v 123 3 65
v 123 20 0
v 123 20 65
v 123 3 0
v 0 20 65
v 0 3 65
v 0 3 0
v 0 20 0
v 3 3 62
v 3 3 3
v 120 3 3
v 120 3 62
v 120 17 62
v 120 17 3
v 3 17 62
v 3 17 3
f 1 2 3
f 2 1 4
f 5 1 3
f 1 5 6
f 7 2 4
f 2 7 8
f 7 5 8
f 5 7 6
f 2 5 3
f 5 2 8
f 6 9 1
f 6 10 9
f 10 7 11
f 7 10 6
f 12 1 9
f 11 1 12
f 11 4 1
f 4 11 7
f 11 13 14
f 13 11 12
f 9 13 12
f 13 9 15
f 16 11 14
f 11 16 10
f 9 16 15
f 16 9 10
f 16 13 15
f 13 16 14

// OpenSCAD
// file: ../_lib/shapes.scad
module box(size, thickness) {
	difference() {
		cube(size);

		translate([thickness, thickness, thickness])
		#cube(size - [thickness * 2, thickness * 2, thickness * 2]);
	}
}

difference() {

	box([10, 20, 30], 1);
	cube([100, 100, 5]);
}
// main file
a5_lx = 115;
a5_ly = 13;
a5_lz = 58;

thickness = 3;
clearance_x = 1;
clearance_y = 0.5;
clearance_z = 0.5;

support_x = 5;
support_z = 3;

use <../_lib/shapes.scad>;

//use <../../shapes.scad>;

module A5_quick() {
	cube([a5_lx, a5_ly, a5_lz]);
}

module A5() {
	cyl_x = 9.5;
	cyl_z = 20;
	sph_r = 3;

$fn = 20;

	translate([cyl_x + sph_r, a5_ly / 2 + sph_r, cyl_z + sph_r])

	minkowski() {
		minkowski() {
			cube([a5_lx - (sph_r + cyl_x) * 2, a5_ly / 2 - sph_r * 2, a5_lz - (sph_r + cyl_z) * 2]);

			scale([1, 1, cyl_z / cyl_x])
			rotate([90, 0, 0])
			cylinder(r = cyl_x, h = a5_ly / 2);
		}

		sphere(r = sph_r);

	}
}

module stand() {
	x = a5_lx + thickness * 2 + clearance_x * 2;
	y = a5_ly + thickness * 2 + clearance_y * 2;
	z = a5_lz + thickness * 2 + clearance_z * 2;

	difference() {
		translate([0, thickness, 0])
		cube([x, y - thickness, z]);

		translate([thickness, -1, thickness])
		cube([x - thickness * 2, y - thickness + 1, z - thickness * 2]);
	}
}

translate([thickness + clearance_x, thickness + clearance_y, thickness + clearance_z]) {
	% A5();
	//% A5_quick();
}
stand();
